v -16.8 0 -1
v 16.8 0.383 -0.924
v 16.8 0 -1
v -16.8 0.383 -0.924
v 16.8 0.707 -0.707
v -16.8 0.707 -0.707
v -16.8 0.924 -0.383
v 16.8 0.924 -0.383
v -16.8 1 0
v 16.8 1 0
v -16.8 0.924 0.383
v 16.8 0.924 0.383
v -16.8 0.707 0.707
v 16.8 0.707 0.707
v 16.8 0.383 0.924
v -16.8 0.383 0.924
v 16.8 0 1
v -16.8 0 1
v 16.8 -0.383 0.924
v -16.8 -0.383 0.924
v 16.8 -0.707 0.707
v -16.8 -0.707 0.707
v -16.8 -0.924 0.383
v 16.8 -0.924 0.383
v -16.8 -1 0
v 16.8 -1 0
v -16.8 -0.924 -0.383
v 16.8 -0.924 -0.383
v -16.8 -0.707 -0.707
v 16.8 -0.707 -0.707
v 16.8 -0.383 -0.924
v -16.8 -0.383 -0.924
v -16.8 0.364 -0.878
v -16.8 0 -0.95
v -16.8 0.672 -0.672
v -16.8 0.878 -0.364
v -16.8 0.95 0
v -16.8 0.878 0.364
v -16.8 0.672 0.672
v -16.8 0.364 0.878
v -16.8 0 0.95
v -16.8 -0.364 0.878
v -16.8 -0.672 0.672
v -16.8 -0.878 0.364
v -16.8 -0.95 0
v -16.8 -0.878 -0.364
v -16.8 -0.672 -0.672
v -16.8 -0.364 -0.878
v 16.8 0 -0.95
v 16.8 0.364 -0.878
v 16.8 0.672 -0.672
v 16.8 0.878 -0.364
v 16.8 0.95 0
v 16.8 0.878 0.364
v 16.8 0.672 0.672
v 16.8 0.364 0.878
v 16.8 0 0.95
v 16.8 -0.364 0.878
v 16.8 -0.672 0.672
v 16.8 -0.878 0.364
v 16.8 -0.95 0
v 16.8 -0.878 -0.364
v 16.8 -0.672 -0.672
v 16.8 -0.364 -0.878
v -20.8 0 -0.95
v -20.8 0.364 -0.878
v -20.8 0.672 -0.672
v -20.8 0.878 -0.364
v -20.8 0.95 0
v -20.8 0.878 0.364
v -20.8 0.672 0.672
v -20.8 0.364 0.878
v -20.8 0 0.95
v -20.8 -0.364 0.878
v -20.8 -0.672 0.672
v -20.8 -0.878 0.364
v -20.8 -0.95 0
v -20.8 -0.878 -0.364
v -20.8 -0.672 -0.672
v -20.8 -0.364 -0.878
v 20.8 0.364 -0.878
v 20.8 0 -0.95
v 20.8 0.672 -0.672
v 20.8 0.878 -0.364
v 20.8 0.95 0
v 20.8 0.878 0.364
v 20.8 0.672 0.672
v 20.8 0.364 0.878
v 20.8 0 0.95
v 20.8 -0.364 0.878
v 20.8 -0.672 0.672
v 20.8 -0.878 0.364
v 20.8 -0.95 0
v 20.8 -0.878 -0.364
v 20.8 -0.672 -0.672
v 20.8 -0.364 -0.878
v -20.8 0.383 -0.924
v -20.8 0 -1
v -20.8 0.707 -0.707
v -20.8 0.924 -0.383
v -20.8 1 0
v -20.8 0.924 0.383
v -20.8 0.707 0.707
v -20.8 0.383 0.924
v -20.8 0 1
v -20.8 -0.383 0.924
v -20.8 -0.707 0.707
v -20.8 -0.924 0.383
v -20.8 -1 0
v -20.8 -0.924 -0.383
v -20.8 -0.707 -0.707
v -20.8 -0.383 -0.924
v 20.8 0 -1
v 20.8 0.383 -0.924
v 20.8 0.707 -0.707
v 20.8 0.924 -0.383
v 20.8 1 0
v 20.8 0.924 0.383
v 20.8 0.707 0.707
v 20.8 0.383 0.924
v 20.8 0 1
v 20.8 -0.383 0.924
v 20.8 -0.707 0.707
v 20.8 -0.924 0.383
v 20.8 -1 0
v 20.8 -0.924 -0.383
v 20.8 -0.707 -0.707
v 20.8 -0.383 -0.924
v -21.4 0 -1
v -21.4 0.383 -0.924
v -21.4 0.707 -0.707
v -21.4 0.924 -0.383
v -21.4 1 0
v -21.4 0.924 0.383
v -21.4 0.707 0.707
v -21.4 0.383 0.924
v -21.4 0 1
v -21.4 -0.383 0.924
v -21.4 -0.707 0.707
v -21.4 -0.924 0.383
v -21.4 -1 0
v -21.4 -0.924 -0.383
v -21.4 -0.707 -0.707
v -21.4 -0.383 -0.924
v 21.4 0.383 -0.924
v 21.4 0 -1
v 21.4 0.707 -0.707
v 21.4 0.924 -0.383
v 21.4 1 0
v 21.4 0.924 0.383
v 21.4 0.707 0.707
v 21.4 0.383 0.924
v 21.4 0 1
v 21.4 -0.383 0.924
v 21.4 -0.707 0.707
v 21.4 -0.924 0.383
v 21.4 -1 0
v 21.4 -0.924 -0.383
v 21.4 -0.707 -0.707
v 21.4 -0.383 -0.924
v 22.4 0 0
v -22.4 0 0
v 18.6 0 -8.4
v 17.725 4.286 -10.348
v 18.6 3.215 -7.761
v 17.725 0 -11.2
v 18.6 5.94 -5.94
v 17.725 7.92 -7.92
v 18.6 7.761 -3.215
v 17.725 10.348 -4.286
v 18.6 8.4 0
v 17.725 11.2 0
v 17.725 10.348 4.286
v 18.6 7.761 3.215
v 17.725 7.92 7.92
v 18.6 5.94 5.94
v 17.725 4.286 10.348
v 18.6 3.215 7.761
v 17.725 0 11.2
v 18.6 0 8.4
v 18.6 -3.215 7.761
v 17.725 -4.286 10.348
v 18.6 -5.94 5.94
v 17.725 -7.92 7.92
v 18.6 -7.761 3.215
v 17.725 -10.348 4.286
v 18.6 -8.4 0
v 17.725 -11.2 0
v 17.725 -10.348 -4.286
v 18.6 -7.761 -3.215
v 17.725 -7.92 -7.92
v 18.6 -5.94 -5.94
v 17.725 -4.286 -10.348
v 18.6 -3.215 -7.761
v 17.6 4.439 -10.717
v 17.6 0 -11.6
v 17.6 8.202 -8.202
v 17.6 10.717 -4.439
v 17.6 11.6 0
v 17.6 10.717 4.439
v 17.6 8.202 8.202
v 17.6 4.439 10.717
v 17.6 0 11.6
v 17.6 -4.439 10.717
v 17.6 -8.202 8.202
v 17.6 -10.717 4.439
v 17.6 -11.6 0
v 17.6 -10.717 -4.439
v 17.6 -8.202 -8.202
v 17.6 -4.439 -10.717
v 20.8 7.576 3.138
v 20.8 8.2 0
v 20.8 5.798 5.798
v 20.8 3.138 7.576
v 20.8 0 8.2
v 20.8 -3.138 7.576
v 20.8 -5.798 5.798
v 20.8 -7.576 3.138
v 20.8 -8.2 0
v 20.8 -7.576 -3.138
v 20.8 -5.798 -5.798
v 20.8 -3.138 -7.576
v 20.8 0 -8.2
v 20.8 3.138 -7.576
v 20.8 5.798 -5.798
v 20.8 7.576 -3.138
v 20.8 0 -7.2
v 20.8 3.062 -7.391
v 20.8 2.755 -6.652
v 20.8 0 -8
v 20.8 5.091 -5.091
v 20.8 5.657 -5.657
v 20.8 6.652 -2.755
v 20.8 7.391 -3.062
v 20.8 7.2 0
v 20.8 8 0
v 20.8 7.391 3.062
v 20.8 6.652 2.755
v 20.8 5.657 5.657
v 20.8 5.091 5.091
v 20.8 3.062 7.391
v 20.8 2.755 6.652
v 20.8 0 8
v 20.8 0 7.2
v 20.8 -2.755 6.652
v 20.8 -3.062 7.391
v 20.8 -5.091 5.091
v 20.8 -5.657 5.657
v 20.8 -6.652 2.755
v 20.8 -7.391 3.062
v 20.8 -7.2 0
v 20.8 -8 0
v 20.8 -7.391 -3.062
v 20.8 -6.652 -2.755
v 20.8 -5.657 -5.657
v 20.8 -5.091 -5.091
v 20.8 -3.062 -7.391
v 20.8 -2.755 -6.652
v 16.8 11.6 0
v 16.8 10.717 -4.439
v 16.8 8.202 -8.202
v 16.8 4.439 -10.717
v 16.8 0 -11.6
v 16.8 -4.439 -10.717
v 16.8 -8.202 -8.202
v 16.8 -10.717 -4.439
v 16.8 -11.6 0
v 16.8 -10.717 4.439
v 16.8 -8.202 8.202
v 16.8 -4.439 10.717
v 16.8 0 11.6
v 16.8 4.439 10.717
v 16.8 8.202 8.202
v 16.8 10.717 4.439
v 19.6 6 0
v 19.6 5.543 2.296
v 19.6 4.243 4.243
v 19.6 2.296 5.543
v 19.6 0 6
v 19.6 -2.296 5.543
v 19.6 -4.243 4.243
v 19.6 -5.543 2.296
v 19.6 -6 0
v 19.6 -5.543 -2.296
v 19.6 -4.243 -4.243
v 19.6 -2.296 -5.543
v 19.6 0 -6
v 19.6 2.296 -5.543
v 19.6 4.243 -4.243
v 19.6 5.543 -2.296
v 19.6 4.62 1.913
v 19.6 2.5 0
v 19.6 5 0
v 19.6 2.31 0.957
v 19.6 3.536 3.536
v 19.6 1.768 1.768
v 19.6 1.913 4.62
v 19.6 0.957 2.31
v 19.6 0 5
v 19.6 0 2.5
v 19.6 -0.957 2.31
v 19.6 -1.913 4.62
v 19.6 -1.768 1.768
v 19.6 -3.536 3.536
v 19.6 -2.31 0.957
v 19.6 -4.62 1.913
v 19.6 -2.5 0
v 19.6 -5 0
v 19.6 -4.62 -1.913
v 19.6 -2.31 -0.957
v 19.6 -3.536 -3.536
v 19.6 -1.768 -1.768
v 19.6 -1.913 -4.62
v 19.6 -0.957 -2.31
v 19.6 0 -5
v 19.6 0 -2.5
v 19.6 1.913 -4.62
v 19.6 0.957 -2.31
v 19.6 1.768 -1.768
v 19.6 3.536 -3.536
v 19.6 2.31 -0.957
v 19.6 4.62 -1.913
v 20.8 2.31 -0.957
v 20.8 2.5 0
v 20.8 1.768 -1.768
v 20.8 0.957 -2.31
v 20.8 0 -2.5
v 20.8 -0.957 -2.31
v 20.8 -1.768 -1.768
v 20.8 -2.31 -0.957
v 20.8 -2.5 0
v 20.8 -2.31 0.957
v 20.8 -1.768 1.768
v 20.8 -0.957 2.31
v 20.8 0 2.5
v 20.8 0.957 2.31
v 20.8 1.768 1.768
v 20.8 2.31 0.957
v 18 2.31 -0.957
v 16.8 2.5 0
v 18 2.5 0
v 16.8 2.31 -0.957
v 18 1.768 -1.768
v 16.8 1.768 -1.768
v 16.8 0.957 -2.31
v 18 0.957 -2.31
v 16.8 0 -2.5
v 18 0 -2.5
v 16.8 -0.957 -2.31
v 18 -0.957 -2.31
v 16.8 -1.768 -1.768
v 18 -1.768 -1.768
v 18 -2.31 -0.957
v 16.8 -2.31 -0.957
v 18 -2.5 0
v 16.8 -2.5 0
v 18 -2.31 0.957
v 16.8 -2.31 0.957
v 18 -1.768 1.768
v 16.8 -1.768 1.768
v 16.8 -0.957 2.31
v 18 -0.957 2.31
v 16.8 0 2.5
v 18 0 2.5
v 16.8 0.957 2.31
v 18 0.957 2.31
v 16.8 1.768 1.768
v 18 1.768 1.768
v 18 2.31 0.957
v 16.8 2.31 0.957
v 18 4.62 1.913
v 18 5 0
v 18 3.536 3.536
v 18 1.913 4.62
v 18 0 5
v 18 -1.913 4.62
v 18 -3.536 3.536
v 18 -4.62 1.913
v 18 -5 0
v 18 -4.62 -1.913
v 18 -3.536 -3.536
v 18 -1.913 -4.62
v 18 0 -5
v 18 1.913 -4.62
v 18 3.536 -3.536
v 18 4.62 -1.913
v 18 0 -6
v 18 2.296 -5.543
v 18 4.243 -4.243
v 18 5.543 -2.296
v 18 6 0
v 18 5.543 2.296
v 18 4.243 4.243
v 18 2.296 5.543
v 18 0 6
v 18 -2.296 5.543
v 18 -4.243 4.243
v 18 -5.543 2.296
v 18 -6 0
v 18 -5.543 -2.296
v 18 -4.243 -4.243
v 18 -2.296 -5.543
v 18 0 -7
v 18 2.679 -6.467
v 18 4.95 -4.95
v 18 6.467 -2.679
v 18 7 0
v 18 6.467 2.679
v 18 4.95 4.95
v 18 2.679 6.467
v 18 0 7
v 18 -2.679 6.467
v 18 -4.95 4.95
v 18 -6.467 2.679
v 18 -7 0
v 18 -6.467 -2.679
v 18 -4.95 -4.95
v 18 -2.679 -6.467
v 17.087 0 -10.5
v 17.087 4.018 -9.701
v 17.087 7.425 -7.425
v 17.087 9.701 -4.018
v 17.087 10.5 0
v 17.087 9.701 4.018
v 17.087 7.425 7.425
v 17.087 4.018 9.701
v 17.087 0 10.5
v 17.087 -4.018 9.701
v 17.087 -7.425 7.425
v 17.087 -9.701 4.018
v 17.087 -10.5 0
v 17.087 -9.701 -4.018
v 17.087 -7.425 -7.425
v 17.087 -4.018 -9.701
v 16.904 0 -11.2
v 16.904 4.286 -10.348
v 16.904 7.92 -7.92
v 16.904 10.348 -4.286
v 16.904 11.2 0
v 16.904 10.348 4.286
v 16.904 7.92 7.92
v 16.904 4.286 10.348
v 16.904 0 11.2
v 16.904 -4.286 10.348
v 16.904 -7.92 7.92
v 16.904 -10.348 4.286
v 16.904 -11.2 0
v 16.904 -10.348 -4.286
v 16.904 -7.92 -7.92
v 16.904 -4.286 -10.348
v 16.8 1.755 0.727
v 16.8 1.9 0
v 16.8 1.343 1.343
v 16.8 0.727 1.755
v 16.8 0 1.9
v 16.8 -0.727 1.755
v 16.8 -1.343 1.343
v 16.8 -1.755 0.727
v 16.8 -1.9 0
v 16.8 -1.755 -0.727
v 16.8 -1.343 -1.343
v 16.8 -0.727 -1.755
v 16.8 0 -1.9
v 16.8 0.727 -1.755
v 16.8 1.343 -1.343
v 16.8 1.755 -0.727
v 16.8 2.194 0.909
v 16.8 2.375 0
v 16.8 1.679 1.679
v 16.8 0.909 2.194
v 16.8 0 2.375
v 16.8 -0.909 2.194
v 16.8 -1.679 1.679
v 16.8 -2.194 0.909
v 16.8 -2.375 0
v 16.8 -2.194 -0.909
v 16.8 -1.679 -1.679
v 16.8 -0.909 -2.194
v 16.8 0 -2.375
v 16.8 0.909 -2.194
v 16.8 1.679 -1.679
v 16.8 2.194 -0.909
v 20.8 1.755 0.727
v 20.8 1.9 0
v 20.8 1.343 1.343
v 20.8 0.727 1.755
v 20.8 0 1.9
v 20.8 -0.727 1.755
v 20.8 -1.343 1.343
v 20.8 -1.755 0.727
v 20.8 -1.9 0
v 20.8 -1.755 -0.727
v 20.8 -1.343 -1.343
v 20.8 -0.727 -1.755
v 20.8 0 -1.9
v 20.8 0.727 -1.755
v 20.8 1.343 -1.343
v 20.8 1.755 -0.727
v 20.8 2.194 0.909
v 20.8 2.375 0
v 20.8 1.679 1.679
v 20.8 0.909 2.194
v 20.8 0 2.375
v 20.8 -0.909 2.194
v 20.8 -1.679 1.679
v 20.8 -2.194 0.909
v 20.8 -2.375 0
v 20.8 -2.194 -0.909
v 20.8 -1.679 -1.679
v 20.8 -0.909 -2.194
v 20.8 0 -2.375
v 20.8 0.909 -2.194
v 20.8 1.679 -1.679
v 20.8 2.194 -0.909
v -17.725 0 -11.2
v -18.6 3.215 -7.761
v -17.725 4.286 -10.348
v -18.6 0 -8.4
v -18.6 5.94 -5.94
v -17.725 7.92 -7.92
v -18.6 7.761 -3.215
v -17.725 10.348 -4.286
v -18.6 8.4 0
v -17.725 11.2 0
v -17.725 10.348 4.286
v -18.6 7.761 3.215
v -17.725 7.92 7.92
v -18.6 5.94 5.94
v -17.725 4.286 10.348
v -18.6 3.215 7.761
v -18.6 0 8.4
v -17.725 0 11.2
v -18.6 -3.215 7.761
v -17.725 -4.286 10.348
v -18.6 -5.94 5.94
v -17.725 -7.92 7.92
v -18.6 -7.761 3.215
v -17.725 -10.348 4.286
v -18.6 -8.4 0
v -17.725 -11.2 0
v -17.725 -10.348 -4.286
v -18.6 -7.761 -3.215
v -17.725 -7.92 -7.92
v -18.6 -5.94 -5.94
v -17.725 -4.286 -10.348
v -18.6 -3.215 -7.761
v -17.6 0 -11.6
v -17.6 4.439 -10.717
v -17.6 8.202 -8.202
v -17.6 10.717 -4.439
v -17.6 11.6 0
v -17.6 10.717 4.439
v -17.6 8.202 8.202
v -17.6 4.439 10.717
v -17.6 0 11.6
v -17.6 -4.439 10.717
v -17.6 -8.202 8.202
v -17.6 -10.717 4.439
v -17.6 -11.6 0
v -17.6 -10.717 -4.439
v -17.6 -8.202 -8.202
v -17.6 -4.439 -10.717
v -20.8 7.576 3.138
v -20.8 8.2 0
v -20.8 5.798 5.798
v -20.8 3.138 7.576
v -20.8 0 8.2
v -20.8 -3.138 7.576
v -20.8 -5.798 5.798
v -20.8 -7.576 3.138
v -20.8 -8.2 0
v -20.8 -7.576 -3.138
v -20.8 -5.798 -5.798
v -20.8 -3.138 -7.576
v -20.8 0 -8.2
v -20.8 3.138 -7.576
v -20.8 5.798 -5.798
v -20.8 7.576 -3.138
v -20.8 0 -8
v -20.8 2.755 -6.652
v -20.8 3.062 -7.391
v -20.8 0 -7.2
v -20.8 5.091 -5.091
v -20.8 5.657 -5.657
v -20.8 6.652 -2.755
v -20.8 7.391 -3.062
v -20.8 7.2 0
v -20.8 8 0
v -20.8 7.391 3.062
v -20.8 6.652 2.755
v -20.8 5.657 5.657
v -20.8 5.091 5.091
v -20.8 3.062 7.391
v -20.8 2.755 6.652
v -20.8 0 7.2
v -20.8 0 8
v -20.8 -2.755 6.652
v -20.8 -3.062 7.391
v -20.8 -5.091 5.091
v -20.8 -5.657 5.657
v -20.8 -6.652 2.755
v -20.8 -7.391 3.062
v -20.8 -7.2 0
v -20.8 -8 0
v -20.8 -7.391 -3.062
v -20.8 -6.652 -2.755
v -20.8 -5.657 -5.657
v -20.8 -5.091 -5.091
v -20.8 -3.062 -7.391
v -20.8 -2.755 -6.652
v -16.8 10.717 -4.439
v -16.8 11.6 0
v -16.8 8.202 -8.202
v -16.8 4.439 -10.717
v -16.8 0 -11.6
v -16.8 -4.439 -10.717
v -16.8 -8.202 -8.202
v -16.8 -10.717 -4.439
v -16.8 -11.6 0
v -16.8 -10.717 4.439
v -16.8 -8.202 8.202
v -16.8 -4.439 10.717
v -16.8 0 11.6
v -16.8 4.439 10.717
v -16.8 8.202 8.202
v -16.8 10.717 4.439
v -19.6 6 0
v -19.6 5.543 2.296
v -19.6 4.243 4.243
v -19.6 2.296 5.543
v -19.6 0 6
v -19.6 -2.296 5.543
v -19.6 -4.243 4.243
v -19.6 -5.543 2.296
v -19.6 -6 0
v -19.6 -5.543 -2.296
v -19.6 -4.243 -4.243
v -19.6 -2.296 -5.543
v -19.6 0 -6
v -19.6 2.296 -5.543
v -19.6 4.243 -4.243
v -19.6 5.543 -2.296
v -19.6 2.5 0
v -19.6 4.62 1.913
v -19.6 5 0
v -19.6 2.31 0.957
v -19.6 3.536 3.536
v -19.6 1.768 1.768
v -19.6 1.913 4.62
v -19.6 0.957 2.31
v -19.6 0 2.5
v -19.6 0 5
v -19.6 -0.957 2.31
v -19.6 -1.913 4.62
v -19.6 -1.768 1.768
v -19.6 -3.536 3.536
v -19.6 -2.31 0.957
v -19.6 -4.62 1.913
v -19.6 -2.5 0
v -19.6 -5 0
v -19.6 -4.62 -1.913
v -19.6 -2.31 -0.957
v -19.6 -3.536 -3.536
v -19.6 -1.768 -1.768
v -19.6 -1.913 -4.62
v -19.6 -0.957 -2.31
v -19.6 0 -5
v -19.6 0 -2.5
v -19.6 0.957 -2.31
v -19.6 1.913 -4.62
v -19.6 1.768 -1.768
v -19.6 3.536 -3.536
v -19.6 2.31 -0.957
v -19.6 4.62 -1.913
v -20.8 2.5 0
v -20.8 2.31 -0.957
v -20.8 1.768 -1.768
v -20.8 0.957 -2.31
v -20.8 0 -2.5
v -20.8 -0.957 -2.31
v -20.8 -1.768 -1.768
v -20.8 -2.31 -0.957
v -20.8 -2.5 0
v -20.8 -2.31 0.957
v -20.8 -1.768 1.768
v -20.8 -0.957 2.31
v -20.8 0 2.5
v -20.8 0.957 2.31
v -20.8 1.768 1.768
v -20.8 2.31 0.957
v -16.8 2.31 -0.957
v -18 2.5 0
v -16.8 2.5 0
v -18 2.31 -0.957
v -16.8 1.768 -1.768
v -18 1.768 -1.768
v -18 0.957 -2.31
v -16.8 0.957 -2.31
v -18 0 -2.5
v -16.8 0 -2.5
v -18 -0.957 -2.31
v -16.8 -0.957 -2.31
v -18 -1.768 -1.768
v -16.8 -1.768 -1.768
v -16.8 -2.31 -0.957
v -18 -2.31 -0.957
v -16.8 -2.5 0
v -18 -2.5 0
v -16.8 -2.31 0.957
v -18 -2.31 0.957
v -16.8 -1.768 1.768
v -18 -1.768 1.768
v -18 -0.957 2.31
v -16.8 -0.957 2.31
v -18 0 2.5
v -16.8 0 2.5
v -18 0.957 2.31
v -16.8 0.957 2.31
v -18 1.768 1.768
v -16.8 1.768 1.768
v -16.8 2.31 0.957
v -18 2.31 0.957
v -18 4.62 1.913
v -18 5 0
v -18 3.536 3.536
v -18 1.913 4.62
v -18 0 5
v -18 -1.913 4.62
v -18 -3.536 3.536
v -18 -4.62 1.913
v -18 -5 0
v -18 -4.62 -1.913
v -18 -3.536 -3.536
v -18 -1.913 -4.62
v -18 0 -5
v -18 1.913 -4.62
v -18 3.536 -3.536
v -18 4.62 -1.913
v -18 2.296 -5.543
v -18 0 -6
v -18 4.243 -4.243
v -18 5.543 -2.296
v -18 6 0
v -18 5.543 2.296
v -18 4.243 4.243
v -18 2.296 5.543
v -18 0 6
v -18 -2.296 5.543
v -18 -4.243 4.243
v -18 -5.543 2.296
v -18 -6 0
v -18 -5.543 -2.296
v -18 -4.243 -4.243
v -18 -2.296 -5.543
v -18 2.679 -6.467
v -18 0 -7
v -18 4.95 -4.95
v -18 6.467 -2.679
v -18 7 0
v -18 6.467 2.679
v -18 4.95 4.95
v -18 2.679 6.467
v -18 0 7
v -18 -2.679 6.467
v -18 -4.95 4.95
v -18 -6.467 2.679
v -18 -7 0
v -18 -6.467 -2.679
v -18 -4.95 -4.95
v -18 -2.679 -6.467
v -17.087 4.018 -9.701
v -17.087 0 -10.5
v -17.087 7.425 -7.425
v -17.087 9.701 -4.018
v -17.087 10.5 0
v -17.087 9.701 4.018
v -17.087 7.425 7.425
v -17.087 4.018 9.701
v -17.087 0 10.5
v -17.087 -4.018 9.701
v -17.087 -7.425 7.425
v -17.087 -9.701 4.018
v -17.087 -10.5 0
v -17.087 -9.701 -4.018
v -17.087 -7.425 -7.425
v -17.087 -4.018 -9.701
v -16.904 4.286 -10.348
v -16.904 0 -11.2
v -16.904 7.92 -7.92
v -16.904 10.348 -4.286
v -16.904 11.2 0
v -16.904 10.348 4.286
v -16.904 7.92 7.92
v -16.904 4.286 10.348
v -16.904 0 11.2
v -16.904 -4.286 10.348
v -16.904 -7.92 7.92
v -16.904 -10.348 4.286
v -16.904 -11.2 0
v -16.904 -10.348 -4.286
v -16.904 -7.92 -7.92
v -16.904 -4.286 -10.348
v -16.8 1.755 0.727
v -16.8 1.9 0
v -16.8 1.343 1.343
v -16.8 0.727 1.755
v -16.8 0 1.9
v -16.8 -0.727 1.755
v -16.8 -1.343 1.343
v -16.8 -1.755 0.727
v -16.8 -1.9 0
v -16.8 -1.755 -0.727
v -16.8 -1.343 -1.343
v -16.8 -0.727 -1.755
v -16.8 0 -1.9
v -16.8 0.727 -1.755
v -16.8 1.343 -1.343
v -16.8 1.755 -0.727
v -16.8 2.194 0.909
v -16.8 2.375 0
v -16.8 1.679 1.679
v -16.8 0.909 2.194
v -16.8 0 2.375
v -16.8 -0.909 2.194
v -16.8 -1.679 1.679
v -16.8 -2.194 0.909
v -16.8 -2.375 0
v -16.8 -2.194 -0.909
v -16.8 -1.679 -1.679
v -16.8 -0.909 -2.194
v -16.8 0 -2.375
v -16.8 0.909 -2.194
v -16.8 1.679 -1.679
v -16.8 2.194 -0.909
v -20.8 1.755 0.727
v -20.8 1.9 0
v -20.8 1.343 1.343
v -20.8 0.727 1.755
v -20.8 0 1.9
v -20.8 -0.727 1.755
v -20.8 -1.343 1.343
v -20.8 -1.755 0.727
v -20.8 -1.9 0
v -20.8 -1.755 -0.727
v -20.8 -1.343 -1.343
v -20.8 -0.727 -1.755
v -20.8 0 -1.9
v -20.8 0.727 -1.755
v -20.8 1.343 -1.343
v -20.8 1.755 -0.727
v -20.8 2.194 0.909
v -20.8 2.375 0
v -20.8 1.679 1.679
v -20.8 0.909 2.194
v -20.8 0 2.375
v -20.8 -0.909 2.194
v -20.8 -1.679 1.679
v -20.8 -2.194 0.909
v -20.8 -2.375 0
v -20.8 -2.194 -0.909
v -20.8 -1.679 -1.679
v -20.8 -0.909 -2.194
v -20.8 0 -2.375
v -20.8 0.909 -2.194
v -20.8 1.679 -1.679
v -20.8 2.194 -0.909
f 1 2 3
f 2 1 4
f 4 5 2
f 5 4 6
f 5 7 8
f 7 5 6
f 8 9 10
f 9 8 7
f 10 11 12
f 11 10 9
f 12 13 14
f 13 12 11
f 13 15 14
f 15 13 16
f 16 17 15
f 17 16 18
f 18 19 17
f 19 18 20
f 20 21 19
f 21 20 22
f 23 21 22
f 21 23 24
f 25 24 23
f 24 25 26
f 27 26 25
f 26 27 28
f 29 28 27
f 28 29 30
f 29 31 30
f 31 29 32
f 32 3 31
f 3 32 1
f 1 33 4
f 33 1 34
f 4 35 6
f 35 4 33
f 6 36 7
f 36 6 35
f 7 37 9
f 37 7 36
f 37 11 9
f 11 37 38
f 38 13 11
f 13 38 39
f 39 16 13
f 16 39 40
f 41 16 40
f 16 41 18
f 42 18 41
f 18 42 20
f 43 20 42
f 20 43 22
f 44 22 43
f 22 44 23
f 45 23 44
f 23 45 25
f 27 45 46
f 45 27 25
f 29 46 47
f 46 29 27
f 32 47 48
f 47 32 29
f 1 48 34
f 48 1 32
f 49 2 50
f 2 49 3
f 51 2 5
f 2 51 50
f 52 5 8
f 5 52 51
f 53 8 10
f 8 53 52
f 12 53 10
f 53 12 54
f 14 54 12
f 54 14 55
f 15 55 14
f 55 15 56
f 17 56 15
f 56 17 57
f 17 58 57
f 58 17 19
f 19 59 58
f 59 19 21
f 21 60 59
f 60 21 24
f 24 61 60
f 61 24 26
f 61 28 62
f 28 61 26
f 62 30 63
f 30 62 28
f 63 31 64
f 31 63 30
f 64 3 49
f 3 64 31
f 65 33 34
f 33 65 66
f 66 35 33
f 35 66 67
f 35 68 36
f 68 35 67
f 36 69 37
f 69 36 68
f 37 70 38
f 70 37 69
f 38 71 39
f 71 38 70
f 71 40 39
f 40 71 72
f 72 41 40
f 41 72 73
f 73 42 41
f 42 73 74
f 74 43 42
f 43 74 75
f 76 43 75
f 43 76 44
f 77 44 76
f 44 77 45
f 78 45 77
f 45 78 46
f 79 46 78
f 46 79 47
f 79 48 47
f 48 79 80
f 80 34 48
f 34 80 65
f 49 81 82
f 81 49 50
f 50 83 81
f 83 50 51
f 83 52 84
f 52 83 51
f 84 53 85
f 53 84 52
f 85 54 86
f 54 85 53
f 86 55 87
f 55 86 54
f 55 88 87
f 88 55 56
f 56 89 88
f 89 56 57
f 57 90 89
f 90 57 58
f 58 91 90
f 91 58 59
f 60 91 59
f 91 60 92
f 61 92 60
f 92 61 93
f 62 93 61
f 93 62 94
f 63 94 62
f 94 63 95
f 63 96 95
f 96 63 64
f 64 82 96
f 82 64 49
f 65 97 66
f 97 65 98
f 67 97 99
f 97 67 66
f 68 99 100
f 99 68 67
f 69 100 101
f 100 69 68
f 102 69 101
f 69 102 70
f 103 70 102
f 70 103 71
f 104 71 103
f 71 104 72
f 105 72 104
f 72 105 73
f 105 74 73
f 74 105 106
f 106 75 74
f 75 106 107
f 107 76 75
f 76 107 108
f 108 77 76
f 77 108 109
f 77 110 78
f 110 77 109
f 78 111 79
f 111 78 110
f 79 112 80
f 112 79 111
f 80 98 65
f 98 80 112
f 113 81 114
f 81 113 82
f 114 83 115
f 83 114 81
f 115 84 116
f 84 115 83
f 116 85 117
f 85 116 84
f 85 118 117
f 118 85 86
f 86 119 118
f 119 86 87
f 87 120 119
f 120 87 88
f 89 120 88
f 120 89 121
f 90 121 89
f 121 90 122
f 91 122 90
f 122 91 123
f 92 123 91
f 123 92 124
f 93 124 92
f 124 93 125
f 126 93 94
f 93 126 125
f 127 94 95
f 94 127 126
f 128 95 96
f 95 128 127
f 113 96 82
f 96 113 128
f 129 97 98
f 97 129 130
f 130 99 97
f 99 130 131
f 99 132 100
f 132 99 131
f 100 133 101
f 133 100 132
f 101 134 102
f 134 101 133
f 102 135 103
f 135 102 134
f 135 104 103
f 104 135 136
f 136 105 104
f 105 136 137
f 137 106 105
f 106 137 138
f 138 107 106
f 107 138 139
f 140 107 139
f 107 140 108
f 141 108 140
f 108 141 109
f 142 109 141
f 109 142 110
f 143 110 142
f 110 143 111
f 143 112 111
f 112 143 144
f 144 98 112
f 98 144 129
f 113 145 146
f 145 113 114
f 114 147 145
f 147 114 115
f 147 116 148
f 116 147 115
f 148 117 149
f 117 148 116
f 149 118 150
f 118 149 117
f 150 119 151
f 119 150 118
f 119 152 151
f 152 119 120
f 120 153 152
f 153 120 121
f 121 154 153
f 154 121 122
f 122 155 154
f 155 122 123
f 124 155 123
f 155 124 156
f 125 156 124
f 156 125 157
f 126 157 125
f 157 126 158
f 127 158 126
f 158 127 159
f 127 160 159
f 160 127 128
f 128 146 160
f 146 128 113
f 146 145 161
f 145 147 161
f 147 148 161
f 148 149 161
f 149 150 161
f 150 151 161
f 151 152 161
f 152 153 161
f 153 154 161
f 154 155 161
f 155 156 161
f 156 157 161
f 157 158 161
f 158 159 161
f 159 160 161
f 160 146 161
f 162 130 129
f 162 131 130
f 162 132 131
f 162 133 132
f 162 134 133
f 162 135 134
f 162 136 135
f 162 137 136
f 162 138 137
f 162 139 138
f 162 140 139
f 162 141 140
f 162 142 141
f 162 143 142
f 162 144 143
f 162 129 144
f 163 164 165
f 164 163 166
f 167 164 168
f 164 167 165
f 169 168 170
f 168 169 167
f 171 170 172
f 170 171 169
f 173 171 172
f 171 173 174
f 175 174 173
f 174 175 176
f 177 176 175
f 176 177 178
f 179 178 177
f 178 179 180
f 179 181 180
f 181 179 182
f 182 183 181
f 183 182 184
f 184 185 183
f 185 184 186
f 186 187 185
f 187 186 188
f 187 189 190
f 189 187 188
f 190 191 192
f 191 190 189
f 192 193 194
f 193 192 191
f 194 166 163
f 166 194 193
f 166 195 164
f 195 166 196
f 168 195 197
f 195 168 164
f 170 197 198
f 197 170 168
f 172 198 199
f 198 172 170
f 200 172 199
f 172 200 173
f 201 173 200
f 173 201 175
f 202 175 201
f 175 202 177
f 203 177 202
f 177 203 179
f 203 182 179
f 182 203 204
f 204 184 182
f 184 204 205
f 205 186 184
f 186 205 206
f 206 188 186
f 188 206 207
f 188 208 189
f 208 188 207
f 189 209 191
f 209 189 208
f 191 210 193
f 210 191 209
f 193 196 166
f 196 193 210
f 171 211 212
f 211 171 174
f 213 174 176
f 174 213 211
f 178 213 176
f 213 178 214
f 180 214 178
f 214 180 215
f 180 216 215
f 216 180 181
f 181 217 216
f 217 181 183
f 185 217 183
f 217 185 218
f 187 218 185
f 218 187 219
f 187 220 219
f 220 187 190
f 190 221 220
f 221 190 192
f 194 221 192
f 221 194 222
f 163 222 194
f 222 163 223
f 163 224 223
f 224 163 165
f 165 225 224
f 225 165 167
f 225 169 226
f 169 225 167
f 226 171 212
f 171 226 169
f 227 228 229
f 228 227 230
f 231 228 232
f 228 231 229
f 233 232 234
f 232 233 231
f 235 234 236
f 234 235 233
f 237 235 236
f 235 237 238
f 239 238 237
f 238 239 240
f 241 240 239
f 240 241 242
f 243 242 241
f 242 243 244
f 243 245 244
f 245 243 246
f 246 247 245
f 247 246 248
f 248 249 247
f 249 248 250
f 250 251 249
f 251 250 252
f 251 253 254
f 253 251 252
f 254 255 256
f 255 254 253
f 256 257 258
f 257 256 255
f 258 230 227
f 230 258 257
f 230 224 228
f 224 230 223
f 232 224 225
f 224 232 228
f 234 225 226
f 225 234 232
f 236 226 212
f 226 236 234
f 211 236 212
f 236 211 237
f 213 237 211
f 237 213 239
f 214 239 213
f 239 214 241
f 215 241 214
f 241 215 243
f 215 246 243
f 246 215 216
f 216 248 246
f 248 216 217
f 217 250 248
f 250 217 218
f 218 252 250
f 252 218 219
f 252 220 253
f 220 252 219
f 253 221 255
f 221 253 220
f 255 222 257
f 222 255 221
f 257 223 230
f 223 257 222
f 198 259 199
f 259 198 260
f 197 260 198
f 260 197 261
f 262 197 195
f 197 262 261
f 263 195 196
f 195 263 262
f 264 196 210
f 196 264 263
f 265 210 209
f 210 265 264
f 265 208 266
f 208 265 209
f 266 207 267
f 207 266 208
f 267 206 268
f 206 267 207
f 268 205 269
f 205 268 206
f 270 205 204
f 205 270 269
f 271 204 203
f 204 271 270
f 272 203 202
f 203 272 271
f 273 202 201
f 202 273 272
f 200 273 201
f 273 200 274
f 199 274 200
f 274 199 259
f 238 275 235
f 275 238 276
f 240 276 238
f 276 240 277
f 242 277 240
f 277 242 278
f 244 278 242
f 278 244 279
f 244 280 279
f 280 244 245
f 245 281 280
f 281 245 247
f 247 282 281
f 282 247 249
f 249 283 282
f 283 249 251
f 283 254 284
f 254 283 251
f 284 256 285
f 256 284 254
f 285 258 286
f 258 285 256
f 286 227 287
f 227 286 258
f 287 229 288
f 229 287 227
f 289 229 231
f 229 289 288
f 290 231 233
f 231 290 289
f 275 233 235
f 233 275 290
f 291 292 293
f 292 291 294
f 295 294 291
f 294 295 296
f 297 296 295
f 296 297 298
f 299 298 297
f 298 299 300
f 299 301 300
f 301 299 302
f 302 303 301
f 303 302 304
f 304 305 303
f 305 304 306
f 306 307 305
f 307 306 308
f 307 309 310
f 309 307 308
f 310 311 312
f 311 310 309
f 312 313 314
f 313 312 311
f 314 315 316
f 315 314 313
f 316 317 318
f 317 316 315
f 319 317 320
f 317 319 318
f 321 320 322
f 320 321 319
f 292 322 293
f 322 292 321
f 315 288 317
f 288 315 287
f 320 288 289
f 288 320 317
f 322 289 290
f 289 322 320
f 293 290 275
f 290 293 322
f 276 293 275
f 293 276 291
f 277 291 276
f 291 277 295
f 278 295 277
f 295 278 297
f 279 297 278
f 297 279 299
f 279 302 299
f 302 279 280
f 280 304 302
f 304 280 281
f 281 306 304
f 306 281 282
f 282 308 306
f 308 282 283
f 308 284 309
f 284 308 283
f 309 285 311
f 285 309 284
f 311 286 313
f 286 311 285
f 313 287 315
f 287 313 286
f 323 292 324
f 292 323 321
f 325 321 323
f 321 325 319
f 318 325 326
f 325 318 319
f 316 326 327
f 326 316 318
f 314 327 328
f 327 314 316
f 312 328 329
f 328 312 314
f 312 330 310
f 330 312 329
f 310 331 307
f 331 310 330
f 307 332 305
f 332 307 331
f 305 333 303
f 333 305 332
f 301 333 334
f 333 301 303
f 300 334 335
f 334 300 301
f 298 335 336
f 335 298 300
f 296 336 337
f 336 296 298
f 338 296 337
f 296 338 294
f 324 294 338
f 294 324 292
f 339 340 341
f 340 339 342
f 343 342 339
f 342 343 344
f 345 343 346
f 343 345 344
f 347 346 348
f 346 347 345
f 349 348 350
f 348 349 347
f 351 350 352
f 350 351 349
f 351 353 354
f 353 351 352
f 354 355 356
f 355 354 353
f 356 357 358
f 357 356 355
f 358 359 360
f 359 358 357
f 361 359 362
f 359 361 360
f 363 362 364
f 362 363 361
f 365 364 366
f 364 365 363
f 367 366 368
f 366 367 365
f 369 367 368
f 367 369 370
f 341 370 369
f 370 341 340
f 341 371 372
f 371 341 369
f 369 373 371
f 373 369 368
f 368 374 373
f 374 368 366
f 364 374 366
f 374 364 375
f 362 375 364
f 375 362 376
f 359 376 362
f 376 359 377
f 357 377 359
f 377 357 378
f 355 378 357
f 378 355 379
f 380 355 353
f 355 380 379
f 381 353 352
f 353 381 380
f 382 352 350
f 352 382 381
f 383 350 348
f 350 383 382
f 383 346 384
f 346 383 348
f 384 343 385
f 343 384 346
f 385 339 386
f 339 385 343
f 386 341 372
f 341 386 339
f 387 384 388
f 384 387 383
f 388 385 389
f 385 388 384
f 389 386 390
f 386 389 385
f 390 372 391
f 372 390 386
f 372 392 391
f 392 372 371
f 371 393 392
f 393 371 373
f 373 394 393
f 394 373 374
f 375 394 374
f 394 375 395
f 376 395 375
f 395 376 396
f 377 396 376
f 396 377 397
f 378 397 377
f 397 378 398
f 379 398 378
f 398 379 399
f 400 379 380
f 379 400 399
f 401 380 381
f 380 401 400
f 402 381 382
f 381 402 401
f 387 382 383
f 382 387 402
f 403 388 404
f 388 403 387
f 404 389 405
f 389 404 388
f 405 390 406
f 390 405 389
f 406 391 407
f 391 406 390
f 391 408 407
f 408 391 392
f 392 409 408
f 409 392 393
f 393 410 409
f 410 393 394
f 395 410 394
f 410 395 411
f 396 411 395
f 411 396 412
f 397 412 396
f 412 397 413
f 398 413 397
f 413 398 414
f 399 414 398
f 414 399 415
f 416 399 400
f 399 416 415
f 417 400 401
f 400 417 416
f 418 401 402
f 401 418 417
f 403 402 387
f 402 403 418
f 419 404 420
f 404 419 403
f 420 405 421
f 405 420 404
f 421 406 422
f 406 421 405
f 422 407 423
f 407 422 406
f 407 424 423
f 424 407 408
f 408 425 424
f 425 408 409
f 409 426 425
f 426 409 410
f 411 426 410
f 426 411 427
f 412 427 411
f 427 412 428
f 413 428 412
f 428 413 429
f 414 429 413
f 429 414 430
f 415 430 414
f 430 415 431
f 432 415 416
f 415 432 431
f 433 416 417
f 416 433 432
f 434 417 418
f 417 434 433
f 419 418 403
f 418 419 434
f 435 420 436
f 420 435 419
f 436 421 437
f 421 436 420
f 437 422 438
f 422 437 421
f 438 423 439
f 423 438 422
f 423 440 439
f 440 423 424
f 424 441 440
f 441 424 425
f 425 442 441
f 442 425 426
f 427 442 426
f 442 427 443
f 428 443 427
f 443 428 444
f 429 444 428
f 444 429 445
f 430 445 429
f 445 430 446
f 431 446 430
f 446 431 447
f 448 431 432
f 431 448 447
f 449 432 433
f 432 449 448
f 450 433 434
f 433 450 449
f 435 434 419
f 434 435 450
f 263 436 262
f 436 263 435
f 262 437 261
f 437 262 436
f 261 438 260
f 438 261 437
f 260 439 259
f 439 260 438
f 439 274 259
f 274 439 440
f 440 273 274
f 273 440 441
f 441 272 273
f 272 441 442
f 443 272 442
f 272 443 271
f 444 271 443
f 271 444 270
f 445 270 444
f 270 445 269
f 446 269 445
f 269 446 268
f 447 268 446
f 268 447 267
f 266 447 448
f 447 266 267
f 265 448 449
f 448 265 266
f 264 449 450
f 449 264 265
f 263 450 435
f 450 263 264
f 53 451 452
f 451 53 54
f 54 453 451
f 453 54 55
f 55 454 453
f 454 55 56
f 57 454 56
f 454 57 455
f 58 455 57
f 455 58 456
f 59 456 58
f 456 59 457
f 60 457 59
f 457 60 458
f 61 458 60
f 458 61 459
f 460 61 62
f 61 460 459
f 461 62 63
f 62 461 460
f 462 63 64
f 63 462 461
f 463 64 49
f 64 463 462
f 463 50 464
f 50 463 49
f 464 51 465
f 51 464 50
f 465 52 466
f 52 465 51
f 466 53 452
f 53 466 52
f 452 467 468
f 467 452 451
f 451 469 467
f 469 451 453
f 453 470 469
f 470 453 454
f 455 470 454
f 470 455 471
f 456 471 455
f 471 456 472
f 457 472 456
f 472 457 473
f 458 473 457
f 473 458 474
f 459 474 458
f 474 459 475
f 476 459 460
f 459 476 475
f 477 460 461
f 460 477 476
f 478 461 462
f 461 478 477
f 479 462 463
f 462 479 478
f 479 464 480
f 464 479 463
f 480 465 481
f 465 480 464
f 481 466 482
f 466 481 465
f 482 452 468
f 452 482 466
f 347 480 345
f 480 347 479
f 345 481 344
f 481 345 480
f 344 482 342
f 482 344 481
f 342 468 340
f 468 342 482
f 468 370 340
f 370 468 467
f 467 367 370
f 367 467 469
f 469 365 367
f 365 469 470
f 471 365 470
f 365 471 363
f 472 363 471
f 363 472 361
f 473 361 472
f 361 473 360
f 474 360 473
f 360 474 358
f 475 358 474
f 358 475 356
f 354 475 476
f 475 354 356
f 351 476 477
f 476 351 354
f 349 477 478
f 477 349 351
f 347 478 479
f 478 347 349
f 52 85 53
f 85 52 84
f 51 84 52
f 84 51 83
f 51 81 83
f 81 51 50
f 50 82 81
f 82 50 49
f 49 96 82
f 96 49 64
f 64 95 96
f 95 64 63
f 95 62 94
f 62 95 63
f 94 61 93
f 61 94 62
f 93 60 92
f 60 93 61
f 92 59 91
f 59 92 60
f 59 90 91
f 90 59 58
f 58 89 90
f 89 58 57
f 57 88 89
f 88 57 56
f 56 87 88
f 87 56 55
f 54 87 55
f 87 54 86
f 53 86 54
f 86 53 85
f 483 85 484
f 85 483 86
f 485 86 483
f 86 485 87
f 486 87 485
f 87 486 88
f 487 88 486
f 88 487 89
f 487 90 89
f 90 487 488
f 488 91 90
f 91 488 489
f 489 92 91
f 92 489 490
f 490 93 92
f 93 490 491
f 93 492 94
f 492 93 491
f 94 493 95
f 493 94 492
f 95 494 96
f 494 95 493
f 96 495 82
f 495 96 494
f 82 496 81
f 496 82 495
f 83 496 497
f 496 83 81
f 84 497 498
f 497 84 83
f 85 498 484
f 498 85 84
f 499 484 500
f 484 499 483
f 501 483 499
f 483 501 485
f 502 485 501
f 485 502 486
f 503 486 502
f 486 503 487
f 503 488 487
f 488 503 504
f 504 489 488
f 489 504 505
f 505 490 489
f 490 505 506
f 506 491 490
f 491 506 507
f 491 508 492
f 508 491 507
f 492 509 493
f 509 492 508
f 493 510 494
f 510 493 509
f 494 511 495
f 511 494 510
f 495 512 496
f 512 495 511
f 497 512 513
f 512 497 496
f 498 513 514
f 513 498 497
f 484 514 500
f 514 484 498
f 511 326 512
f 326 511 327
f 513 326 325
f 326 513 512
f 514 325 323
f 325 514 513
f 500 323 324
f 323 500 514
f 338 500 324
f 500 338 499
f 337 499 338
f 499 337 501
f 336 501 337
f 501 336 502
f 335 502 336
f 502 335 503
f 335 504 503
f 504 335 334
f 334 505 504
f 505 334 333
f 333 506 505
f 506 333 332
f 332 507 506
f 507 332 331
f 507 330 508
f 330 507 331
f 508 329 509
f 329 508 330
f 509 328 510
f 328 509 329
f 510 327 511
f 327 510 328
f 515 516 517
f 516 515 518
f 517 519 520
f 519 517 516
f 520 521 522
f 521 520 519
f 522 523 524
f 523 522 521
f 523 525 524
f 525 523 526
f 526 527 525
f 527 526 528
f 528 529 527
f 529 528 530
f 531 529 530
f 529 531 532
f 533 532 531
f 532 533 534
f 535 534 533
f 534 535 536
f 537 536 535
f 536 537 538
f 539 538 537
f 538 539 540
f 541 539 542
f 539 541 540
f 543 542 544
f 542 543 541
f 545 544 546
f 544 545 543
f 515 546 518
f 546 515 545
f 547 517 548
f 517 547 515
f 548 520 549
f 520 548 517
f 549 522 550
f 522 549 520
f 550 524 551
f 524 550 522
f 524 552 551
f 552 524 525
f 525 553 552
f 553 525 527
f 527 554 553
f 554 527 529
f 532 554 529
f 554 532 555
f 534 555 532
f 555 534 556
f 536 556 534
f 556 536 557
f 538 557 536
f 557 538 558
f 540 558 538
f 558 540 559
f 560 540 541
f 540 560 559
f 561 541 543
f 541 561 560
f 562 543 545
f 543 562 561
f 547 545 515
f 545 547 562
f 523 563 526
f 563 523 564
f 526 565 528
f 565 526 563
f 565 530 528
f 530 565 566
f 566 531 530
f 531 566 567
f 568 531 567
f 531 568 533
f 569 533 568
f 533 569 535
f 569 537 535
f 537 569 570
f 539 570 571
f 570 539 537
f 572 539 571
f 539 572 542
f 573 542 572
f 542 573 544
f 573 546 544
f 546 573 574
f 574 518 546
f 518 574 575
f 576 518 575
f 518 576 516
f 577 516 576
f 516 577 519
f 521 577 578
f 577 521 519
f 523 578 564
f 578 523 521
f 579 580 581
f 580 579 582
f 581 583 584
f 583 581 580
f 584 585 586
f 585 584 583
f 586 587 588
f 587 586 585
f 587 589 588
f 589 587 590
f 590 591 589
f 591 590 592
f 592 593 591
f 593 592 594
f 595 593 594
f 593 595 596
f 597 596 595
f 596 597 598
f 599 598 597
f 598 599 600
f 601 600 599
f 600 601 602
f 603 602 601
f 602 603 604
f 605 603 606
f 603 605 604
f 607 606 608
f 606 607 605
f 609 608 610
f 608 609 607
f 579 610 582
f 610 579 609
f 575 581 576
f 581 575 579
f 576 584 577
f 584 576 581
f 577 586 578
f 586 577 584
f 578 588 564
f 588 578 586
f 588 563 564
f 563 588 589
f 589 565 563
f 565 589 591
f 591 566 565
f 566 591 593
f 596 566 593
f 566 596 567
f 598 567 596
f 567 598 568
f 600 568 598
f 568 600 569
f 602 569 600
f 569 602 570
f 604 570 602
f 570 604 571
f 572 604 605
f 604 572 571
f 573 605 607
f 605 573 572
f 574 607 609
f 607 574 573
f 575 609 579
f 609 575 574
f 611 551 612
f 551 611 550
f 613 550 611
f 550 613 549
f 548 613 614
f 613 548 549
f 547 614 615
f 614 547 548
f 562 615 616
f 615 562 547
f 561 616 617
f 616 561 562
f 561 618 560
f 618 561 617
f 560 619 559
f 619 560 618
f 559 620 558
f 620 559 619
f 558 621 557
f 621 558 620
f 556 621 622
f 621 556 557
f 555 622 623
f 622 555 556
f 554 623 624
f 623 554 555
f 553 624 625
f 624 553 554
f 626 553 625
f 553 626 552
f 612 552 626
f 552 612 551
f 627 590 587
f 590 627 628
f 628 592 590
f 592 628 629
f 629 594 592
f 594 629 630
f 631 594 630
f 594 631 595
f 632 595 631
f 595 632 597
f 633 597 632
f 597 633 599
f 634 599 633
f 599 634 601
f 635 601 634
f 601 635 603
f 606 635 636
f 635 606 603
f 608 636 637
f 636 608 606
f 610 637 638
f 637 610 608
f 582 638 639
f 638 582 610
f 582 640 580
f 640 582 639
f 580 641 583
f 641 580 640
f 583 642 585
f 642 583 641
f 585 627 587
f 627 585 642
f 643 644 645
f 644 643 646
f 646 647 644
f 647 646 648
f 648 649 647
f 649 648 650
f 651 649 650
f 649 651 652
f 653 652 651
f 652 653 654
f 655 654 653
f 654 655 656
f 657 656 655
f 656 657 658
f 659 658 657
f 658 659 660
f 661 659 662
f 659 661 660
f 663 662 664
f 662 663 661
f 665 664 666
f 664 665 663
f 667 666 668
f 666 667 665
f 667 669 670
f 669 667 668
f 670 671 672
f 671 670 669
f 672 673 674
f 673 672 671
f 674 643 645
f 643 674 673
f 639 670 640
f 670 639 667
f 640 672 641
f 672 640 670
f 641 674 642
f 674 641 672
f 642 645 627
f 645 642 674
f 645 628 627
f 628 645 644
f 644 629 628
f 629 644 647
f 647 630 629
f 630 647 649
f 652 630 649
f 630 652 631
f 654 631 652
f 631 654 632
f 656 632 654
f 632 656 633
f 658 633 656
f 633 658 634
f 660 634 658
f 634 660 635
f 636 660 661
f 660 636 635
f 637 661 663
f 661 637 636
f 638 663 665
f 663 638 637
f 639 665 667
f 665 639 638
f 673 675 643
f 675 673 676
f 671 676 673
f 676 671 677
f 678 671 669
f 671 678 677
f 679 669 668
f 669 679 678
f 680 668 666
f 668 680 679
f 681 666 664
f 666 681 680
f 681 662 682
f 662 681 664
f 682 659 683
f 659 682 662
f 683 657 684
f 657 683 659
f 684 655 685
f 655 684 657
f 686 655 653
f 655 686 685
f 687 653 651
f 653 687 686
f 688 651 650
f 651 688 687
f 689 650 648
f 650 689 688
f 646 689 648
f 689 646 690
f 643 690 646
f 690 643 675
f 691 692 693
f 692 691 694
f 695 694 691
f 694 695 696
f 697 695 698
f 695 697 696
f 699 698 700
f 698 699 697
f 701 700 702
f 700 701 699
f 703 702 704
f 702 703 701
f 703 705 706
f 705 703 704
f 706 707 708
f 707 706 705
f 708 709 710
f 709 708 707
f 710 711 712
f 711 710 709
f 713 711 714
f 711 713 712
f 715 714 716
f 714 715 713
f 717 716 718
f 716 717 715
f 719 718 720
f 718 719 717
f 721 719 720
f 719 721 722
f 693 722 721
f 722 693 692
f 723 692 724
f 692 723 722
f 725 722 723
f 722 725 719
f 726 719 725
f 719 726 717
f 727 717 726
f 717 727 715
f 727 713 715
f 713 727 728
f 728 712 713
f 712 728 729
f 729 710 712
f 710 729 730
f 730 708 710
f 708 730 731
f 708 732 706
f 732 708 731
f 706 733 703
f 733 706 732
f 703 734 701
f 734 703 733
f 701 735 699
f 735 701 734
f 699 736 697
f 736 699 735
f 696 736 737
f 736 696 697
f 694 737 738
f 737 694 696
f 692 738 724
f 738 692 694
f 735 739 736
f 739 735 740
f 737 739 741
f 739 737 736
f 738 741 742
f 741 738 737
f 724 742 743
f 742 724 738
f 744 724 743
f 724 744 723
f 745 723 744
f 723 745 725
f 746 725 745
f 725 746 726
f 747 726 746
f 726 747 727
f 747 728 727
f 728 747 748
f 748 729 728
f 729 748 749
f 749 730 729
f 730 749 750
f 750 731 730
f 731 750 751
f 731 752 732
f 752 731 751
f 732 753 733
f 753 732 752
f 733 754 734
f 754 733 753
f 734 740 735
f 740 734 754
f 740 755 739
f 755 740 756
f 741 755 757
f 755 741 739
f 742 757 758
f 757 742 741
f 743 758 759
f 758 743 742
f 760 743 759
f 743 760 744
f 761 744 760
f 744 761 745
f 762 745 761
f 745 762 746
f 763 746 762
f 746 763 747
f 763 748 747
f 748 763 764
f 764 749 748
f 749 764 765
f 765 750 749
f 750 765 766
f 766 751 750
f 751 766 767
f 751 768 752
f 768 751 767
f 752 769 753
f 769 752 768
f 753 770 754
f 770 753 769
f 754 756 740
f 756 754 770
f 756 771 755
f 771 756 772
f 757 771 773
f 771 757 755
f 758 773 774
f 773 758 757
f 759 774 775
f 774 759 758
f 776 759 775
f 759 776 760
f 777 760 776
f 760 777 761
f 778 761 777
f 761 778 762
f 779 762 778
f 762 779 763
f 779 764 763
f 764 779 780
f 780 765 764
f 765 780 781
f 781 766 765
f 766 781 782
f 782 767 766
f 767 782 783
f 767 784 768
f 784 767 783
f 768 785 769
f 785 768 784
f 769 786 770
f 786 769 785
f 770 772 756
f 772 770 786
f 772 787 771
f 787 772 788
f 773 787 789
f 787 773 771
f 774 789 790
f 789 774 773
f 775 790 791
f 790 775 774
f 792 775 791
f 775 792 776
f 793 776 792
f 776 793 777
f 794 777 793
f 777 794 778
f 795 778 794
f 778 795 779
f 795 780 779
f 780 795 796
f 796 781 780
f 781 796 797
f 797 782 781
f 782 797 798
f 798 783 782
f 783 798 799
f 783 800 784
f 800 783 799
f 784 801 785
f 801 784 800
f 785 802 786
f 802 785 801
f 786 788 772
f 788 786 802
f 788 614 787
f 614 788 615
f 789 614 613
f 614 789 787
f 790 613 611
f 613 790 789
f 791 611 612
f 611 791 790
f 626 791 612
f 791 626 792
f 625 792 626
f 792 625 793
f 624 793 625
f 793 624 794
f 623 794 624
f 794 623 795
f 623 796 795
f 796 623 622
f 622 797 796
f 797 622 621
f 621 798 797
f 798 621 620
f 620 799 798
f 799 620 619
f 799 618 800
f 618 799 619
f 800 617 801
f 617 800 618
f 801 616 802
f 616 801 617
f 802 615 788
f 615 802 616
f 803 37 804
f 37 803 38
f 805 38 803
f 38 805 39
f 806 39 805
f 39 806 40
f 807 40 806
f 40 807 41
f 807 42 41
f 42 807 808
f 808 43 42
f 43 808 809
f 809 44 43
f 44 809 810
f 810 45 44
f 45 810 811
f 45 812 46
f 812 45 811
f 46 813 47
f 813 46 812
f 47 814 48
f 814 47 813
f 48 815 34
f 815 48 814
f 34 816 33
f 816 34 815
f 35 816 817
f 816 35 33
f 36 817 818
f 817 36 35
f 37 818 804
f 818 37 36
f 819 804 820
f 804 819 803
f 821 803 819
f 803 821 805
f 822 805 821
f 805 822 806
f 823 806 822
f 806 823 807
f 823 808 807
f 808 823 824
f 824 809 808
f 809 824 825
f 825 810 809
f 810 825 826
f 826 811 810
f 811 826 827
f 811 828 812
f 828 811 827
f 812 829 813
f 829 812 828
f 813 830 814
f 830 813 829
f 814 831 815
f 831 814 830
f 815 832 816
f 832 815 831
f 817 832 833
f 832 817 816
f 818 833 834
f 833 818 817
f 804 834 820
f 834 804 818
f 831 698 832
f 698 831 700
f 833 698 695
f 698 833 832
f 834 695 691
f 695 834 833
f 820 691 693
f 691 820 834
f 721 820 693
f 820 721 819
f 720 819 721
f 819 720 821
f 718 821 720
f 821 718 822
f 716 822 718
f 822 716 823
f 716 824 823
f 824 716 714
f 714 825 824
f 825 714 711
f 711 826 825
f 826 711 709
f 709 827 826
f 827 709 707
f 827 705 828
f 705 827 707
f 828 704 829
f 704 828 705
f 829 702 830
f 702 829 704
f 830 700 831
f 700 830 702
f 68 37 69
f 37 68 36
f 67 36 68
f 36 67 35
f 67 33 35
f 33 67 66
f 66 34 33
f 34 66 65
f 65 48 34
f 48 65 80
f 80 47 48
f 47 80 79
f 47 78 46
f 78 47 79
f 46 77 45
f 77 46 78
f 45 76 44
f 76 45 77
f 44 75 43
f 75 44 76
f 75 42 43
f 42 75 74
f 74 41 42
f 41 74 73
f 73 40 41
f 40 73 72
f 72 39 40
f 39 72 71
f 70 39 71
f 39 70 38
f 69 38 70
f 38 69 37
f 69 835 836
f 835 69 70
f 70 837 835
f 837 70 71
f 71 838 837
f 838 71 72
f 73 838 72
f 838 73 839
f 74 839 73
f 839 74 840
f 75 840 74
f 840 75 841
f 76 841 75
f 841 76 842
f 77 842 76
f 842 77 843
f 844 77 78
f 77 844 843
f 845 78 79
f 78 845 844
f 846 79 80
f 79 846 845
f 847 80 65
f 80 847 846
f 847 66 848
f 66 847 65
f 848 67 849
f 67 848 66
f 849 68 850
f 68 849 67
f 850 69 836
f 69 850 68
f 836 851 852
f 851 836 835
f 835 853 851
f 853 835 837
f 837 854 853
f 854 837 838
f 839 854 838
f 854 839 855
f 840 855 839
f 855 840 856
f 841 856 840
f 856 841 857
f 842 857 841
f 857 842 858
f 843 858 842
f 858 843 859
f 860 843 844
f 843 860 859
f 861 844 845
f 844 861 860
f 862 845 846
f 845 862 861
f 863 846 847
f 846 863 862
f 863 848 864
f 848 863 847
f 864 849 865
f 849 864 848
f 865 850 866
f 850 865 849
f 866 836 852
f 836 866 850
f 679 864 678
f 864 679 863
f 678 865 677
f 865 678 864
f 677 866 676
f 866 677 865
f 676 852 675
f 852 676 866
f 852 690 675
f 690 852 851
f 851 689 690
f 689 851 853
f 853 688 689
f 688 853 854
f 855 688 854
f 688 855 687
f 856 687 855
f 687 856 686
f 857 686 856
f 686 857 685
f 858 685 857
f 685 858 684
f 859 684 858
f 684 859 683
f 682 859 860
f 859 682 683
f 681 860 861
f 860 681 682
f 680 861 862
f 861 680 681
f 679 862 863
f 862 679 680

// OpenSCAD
use <../lib.scad>
use <2879.scad>
use <70720.scad>
$fa=1; $fs=0.2;
function ldraw_lib__70720c01(realsolid=false) = [
// 0 ~Axle Steel  5 x 112 LDU with Conical Ends with Two Train Wheels with Open Centres
// 0 Name: 70720c01.dat
// 0 Author: Magnus Forsberg [MagFors]
// 0 !LDRAW_ORG Shortcut UPDATE 2013-02
// 0 !LICENSE Licensed under CC BY 2.0 and CC BY 4.0 : see CAreadme.txt
// 
// 0 BFC CERTIFY CCW
  [0,"BFC","CERTIFY"],
  [0,"BFC","CCW"],
// 
// 0 !CATEGORY Wheel
// 
// 0 !HISTORY 2013-06-29 [MMR1988] Updated description
// 0 !HISTORY 2013-12-23 [PTadmin] Official Update 2013-02
// 
// 
// 1 494 0 0 0 1 0 0 0 1 0 0 0 1 70720.dat
  [1,494,0,0,0,1,0,0,0,1,0,0,0,1, ldraw_lib__70720(realsolid)],
// 1 16 50 0 0 0 0 -1 0 1 0 1 0 0 2879.dat
  [1,16,50,0,0,0,0,-1,0,1,0,1,0,0, ldraw_lib__2879(realsolid)],
// 1 16 -50 0 0 0 0 1 0 1 0 1 0 0 2879.dat
  [1,16,-50,0,0,0,0,1,0,1,0,1,0,0, ldraw_lib__2879(realsolid)],
];
module ldraw_lib__70720c01(step=0, col=false, unit=2/5, alt=false, line=0.2, solid=!$preview)
    makepoly(ldraw_lib__70720c01(solid), step=step, col=col, unit=unit, alt=alt, line=line, solid=solid);
ldraw_lib__70720c01(line=0.2);
